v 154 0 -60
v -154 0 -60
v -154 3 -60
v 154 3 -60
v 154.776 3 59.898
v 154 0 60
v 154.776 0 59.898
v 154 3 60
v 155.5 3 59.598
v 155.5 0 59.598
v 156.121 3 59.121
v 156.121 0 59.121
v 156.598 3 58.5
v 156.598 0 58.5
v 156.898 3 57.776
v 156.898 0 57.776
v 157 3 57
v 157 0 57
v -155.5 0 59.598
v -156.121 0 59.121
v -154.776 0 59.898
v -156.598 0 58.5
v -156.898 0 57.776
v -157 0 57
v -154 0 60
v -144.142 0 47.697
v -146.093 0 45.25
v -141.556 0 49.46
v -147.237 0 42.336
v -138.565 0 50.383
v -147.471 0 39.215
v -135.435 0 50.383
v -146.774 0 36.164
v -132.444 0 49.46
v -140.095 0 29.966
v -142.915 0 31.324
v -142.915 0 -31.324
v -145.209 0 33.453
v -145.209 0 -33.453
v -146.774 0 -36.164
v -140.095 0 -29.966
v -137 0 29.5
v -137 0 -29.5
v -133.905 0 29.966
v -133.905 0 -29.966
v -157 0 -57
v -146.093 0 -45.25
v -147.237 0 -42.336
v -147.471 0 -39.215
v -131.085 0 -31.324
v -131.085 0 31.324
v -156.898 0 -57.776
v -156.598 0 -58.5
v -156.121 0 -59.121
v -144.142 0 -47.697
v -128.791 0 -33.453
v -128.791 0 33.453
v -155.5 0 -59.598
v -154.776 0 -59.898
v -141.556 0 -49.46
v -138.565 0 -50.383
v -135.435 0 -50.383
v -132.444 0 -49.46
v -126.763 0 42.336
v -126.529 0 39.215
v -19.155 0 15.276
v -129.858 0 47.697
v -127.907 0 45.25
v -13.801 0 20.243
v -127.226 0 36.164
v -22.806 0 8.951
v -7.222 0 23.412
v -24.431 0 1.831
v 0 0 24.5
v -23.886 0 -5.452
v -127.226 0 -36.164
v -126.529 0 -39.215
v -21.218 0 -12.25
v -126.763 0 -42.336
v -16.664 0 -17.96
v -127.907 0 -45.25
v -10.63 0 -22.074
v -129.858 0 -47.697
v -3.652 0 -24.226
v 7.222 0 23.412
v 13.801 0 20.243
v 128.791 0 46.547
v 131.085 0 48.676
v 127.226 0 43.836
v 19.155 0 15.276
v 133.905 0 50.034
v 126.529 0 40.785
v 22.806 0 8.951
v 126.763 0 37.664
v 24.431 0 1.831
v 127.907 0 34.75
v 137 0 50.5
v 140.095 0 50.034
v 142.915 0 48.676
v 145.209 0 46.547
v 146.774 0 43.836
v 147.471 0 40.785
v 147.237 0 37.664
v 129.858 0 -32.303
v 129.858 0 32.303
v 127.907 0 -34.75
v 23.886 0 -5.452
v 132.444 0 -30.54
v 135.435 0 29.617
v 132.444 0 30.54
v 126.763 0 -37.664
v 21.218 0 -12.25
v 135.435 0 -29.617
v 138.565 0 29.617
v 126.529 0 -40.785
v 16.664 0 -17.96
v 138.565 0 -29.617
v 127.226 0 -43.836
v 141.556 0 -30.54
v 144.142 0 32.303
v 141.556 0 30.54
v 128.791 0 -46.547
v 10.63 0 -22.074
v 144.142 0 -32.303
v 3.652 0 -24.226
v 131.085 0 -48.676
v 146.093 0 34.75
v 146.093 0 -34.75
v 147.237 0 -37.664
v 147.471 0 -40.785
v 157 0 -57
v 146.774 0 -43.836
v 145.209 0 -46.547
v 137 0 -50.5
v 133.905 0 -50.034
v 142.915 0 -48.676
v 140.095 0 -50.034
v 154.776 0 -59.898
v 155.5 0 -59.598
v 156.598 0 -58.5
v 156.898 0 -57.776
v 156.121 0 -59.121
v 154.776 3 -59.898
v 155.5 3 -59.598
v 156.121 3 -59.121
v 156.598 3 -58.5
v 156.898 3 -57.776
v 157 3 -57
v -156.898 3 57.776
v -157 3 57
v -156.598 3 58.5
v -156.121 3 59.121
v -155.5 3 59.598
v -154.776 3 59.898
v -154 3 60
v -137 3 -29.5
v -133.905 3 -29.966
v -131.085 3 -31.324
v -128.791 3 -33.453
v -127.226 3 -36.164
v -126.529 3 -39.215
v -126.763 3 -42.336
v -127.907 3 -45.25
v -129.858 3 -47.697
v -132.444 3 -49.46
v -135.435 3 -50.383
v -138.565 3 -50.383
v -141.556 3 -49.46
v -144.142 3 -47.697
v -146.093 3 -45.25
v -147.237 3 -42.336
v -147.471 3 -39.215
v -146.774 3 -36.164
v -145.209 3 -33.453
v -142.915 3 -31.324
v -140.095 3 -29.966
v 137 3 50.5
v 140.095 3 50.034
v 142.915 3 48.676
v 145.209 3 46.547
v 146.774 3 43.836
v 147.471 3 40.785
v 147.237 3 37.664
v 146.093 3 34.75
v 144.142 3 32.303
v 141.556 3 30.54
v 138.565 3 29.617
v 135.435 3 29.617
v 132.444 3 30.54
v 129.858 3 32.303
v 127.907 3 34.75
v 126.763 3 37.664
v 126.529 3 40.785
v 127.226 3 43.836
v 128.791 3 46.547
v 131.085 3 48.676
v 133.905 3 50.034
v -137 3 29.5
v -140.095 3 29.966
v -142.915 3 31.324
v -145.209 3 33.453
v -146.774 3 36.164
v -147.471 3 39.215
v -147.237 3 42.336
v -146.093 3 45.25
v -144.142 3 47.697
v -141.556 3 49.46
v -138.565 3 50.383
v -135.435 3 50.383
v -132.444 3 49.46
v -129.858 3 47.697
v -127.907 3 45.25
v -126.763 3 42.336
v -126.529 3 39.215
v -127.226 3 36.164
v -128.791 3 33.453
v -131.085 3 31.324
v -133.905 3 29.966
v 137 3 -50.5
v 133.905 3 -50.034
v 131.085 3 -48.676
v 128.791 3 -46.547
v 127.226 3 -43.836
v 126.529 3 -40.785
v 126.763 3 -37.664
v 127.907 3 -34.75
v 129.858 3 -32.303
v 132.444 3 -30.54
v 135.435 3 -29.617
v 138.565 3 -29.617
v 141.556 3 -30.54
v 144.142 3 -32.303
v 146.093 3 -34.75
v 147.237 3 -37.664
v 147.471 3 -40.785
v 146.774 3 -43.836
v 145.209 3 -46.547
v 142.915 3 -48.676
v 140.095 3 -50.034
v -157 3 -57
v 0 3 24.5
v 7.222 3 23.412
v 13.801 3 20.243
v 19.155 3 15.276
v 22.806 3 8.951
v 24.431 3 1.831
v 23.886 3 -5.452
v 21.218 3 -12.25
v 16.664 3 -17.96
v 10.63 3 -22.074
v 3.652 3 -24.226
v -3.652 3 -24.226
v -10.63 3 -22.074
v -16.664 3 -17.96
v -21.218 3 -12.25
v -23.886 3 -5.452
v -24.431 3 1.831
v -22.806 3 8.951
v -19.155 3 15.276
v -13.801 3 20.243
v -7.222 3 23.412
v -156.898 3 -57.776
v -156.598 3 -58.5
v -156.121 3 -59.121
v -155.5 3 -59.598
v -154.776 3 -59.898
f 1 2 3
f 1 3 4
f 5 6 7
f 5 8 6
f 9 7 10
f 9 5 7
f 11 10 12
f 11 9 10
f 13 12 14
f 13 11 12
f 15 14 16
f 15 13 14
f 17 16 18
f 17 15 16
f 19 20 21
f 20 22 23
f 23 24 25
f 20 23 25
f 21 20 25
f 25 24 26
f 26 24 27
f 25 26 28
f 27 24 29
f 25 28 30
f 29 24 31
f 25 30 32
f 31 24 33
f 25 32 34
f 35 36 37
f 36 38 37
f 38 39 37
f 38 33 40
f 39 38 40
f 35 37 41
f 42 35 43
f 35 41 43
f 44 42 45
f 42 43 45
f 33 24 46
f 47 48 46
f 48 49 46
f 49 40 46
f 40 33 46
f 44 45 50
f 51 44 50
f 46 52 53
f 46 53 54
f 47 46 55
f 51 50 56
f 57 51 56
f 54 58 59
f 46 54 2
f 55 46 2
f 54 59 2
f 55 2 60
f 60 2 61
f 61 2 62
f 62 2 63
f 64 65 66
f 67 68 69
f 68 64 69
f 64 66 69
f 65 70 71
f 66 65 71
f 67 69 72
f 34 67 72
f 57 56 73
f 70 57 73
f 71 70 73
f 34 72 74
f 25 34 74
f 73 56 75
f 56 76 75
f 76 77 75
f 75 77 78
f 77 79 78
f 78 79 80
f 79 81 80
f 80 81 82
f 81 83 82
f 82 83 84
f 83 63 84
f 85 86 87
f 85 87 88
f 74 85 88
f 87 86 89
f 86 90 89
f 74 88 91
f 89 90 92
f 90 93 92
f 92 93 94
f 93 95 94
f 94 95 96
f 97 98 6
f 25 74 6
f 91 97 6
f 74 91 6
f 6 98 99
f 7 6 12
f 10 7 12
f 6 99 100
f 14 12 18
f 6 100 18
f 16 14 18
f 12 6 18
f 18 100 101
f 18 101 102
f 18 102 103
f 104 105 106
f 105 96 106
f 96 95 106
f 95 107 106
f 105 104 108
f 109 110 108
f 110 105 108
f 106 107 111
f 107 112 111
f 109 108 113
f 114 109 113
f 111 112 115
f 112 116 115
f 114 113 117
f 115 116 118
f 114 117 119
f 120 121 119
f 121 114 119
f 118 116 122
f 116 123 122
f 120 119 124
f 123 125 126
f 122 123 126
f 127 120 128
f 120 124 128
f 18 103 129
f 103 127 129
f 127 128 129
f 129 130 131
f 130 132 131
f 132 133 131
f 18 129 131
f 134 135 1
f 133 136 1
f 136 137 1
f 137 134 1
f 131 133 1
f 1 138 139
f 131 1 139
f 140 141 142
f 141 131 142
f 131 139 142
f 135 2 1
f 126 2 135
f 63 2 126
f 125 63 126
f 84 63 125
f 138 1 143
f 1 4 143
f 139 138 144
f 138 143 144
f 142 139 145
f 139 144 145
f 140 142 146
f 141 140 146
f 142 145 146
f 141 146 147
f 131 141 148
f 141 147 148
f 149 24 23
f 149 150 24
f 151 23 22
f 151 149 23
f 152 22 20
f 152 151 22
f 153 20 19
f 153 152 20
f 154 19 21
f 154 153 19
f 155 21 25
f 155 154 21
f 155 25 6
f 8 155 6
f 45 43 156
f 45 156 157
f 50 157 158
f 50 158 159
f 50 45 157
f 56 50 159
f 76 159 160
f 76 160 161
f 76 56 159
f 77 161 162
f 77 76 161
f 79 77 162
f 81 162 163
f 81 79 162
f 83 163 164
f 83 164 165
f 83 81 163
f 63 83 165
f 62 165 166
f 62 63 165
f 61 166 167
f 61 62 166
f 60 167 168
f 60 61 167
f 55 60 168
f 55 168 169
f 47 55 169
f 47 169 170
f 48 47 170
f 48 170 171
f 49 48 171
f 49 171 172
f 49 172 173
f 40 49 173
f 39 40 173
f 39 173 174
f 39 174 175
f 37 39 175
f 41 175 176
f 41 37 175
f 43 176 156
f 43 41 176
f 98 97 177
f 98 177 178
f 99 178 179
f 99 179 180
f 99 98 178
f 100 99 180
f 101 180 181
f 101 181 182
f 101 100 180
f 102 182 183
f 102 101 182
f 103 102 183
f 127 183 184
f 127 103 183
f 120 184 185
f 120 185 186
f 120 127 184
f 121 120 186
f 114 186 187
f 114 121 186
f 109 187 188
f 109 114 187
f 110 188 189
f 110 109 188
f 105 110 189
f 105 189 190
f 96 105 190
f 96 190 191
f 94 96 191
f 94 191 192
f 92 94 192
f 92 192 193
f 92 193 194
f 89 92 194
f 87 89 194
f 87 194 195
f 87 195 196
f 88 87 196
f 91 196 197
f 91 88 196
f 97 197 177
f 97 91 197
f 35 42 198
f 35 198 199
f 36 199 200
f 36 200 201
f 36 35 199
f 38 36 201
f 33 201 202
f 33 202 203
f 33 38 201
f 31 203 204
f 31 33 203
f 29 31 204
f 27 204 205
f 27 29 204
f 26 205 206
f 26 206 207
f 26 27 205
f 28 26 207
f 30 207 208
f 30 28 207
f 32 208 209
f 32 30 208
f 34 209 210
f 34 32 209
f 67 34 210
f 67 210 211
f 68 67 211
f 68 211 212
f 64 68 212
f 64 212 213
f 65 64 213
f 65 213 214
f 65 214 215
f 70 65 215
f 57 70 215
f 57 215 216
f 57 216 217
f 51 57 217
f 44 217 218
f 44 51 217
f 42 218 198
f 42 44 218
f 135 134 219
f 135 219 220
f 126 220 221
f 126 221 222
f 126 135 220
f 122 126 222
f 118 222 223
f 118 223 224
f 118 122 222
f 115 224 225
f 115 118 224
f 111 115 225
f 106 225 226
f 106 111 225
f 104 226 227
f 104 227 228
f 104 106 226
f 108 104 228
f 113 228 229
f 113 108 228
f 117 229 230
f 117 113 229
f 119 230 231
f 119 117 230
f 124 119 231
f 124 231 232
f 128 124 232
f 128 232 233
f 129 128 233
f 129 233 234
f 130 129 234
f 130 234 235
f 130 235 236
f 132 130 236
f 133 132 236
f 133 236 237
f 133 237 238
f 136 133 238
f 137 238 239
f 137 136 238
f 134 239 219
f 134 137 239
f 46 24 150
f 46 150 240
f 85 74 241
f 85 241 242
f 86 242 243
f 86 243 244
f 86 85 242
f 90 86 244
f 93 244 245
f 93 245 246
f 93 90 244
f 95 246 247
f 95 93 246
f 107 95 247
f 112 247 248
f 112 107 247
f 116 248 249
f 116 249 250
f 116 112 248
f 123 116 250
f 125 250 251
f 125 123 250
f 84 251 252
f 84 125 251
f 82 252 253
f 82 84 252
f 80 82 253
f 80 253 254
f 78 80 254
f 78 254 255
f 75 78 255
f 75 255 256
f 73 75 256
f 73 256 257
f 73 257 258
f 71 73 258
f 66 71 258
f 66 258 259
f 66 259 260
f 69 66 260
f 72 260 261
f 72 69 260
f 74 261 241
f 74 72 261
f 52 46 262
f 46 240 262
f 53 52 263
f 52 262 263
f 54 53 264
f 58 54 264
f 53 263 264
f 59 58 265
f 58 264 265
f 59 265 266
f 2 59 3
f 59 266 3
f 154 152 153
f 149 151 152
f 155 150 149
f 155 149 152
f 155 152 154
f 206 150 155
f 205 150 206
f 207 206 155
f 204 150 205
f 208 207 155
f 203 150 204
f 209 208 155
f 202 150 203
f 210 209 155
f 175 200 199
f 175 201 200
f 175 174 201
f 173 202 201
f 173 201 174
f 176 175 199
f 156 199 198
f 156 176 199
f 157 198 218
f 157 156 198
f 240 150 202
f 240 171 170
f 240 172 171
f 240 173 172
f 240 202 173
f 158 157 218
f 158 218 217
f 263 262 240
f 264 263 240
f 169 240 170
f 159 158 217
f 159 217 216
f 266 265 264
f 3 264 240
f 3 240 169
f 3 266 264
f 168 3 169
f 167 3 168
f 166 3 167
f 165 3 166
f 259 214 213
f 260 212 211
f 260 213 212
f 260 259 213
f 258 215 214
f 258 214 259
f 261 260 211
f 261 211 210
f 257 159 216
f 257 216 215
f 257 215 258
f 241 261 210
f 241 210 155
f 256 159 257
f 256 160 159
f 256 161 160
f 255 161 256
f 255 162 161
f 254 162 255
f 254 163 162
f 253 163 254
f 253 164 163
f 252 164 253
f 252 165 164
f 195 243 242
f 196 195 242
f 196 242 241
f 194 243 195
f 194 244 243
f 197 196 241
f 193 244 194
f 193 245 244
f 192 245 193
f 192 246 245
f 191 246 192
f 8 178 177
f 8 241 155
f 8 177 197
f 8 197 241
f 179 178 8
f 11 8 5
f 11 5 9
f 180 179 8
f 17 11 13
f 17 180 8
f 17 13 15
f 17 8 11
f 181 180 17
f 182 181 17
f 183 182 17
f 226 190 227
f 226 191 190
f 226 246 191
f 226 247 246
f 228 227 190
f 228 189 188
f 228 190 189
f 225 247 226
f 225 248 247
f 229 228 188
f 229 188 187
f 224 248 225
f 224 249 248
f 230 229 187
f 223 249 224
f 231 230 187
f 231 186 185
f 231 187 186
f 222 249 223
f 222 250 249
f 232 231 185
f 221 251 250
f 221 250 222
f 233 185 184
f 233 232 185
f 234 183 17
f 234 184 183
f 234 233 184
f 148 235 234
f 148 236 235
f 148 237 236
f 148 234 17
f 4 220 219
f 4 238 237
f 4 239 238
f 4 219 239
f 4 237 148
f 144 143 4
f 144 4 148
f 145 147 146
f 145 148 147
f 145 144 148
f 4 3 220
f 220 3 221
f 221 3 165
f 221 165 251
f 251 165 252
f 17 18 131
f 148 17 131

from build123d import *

# Parameters (mm, degrees)
SKETCH1_W           = 314
SKETCH1_H           = 120
SKETCH1_R           = 24.5
SKETCH1_R_2         = 10.5
BOSS_EXTRUDE1_DEPTH = 3
FILLET1_R           = 3


with BuildPart() as part:
    # Sketch1 → Boss-Extrude1 (new body)
    with BuildSketch(Plane(origin=(0, 0, 0), x_dir=(1, 0, 0), z_dir=(0, 1, 0))):
        Rectangle(SKETCH1_W, SKETCH1_H)
        with Locations(Location((0, 0, 0), (0, 0, 270))):
            Circle(SKETCH1_R, mode=Mode.SUBTRACT)
        with Locations(Location((-137, 40, 0), (0, 0, 270))):
            Circle(SKETCH1_R_2, mode=Mode.SUBTRACT)
        with Locations(Location((137, 40, 0), (0, 0, 90))):
            Circle(SKETCH1_R_2, mode=Mode.SUBTRACT)
        with Locations(Location((137, -40, 0), (0, 0, 270))):
            Circle(SKETCH1_R_2, mode=Mode.SUBTRACT)
        with Locations(Location((-137, -40, 0), (0, 0, 90))):
            Circle(SKETCH1_R_2, mode=Mode.SUBTRACT)
    extrude(amount=BOSS_EXTRUDE1_DEPTH)

    # Fillet1
    fillet1_edges = [part.edges().sort_by_distance(p)[0] for p in [
        (157, 1.5, -60),
        (157, 1.5, 60),
        (-157, 1.5, 60),
        (-157, 1.5, -60),
    ]]
    fillet(fillet1_edges, radius=FILLET1_R)


solid = part.part
